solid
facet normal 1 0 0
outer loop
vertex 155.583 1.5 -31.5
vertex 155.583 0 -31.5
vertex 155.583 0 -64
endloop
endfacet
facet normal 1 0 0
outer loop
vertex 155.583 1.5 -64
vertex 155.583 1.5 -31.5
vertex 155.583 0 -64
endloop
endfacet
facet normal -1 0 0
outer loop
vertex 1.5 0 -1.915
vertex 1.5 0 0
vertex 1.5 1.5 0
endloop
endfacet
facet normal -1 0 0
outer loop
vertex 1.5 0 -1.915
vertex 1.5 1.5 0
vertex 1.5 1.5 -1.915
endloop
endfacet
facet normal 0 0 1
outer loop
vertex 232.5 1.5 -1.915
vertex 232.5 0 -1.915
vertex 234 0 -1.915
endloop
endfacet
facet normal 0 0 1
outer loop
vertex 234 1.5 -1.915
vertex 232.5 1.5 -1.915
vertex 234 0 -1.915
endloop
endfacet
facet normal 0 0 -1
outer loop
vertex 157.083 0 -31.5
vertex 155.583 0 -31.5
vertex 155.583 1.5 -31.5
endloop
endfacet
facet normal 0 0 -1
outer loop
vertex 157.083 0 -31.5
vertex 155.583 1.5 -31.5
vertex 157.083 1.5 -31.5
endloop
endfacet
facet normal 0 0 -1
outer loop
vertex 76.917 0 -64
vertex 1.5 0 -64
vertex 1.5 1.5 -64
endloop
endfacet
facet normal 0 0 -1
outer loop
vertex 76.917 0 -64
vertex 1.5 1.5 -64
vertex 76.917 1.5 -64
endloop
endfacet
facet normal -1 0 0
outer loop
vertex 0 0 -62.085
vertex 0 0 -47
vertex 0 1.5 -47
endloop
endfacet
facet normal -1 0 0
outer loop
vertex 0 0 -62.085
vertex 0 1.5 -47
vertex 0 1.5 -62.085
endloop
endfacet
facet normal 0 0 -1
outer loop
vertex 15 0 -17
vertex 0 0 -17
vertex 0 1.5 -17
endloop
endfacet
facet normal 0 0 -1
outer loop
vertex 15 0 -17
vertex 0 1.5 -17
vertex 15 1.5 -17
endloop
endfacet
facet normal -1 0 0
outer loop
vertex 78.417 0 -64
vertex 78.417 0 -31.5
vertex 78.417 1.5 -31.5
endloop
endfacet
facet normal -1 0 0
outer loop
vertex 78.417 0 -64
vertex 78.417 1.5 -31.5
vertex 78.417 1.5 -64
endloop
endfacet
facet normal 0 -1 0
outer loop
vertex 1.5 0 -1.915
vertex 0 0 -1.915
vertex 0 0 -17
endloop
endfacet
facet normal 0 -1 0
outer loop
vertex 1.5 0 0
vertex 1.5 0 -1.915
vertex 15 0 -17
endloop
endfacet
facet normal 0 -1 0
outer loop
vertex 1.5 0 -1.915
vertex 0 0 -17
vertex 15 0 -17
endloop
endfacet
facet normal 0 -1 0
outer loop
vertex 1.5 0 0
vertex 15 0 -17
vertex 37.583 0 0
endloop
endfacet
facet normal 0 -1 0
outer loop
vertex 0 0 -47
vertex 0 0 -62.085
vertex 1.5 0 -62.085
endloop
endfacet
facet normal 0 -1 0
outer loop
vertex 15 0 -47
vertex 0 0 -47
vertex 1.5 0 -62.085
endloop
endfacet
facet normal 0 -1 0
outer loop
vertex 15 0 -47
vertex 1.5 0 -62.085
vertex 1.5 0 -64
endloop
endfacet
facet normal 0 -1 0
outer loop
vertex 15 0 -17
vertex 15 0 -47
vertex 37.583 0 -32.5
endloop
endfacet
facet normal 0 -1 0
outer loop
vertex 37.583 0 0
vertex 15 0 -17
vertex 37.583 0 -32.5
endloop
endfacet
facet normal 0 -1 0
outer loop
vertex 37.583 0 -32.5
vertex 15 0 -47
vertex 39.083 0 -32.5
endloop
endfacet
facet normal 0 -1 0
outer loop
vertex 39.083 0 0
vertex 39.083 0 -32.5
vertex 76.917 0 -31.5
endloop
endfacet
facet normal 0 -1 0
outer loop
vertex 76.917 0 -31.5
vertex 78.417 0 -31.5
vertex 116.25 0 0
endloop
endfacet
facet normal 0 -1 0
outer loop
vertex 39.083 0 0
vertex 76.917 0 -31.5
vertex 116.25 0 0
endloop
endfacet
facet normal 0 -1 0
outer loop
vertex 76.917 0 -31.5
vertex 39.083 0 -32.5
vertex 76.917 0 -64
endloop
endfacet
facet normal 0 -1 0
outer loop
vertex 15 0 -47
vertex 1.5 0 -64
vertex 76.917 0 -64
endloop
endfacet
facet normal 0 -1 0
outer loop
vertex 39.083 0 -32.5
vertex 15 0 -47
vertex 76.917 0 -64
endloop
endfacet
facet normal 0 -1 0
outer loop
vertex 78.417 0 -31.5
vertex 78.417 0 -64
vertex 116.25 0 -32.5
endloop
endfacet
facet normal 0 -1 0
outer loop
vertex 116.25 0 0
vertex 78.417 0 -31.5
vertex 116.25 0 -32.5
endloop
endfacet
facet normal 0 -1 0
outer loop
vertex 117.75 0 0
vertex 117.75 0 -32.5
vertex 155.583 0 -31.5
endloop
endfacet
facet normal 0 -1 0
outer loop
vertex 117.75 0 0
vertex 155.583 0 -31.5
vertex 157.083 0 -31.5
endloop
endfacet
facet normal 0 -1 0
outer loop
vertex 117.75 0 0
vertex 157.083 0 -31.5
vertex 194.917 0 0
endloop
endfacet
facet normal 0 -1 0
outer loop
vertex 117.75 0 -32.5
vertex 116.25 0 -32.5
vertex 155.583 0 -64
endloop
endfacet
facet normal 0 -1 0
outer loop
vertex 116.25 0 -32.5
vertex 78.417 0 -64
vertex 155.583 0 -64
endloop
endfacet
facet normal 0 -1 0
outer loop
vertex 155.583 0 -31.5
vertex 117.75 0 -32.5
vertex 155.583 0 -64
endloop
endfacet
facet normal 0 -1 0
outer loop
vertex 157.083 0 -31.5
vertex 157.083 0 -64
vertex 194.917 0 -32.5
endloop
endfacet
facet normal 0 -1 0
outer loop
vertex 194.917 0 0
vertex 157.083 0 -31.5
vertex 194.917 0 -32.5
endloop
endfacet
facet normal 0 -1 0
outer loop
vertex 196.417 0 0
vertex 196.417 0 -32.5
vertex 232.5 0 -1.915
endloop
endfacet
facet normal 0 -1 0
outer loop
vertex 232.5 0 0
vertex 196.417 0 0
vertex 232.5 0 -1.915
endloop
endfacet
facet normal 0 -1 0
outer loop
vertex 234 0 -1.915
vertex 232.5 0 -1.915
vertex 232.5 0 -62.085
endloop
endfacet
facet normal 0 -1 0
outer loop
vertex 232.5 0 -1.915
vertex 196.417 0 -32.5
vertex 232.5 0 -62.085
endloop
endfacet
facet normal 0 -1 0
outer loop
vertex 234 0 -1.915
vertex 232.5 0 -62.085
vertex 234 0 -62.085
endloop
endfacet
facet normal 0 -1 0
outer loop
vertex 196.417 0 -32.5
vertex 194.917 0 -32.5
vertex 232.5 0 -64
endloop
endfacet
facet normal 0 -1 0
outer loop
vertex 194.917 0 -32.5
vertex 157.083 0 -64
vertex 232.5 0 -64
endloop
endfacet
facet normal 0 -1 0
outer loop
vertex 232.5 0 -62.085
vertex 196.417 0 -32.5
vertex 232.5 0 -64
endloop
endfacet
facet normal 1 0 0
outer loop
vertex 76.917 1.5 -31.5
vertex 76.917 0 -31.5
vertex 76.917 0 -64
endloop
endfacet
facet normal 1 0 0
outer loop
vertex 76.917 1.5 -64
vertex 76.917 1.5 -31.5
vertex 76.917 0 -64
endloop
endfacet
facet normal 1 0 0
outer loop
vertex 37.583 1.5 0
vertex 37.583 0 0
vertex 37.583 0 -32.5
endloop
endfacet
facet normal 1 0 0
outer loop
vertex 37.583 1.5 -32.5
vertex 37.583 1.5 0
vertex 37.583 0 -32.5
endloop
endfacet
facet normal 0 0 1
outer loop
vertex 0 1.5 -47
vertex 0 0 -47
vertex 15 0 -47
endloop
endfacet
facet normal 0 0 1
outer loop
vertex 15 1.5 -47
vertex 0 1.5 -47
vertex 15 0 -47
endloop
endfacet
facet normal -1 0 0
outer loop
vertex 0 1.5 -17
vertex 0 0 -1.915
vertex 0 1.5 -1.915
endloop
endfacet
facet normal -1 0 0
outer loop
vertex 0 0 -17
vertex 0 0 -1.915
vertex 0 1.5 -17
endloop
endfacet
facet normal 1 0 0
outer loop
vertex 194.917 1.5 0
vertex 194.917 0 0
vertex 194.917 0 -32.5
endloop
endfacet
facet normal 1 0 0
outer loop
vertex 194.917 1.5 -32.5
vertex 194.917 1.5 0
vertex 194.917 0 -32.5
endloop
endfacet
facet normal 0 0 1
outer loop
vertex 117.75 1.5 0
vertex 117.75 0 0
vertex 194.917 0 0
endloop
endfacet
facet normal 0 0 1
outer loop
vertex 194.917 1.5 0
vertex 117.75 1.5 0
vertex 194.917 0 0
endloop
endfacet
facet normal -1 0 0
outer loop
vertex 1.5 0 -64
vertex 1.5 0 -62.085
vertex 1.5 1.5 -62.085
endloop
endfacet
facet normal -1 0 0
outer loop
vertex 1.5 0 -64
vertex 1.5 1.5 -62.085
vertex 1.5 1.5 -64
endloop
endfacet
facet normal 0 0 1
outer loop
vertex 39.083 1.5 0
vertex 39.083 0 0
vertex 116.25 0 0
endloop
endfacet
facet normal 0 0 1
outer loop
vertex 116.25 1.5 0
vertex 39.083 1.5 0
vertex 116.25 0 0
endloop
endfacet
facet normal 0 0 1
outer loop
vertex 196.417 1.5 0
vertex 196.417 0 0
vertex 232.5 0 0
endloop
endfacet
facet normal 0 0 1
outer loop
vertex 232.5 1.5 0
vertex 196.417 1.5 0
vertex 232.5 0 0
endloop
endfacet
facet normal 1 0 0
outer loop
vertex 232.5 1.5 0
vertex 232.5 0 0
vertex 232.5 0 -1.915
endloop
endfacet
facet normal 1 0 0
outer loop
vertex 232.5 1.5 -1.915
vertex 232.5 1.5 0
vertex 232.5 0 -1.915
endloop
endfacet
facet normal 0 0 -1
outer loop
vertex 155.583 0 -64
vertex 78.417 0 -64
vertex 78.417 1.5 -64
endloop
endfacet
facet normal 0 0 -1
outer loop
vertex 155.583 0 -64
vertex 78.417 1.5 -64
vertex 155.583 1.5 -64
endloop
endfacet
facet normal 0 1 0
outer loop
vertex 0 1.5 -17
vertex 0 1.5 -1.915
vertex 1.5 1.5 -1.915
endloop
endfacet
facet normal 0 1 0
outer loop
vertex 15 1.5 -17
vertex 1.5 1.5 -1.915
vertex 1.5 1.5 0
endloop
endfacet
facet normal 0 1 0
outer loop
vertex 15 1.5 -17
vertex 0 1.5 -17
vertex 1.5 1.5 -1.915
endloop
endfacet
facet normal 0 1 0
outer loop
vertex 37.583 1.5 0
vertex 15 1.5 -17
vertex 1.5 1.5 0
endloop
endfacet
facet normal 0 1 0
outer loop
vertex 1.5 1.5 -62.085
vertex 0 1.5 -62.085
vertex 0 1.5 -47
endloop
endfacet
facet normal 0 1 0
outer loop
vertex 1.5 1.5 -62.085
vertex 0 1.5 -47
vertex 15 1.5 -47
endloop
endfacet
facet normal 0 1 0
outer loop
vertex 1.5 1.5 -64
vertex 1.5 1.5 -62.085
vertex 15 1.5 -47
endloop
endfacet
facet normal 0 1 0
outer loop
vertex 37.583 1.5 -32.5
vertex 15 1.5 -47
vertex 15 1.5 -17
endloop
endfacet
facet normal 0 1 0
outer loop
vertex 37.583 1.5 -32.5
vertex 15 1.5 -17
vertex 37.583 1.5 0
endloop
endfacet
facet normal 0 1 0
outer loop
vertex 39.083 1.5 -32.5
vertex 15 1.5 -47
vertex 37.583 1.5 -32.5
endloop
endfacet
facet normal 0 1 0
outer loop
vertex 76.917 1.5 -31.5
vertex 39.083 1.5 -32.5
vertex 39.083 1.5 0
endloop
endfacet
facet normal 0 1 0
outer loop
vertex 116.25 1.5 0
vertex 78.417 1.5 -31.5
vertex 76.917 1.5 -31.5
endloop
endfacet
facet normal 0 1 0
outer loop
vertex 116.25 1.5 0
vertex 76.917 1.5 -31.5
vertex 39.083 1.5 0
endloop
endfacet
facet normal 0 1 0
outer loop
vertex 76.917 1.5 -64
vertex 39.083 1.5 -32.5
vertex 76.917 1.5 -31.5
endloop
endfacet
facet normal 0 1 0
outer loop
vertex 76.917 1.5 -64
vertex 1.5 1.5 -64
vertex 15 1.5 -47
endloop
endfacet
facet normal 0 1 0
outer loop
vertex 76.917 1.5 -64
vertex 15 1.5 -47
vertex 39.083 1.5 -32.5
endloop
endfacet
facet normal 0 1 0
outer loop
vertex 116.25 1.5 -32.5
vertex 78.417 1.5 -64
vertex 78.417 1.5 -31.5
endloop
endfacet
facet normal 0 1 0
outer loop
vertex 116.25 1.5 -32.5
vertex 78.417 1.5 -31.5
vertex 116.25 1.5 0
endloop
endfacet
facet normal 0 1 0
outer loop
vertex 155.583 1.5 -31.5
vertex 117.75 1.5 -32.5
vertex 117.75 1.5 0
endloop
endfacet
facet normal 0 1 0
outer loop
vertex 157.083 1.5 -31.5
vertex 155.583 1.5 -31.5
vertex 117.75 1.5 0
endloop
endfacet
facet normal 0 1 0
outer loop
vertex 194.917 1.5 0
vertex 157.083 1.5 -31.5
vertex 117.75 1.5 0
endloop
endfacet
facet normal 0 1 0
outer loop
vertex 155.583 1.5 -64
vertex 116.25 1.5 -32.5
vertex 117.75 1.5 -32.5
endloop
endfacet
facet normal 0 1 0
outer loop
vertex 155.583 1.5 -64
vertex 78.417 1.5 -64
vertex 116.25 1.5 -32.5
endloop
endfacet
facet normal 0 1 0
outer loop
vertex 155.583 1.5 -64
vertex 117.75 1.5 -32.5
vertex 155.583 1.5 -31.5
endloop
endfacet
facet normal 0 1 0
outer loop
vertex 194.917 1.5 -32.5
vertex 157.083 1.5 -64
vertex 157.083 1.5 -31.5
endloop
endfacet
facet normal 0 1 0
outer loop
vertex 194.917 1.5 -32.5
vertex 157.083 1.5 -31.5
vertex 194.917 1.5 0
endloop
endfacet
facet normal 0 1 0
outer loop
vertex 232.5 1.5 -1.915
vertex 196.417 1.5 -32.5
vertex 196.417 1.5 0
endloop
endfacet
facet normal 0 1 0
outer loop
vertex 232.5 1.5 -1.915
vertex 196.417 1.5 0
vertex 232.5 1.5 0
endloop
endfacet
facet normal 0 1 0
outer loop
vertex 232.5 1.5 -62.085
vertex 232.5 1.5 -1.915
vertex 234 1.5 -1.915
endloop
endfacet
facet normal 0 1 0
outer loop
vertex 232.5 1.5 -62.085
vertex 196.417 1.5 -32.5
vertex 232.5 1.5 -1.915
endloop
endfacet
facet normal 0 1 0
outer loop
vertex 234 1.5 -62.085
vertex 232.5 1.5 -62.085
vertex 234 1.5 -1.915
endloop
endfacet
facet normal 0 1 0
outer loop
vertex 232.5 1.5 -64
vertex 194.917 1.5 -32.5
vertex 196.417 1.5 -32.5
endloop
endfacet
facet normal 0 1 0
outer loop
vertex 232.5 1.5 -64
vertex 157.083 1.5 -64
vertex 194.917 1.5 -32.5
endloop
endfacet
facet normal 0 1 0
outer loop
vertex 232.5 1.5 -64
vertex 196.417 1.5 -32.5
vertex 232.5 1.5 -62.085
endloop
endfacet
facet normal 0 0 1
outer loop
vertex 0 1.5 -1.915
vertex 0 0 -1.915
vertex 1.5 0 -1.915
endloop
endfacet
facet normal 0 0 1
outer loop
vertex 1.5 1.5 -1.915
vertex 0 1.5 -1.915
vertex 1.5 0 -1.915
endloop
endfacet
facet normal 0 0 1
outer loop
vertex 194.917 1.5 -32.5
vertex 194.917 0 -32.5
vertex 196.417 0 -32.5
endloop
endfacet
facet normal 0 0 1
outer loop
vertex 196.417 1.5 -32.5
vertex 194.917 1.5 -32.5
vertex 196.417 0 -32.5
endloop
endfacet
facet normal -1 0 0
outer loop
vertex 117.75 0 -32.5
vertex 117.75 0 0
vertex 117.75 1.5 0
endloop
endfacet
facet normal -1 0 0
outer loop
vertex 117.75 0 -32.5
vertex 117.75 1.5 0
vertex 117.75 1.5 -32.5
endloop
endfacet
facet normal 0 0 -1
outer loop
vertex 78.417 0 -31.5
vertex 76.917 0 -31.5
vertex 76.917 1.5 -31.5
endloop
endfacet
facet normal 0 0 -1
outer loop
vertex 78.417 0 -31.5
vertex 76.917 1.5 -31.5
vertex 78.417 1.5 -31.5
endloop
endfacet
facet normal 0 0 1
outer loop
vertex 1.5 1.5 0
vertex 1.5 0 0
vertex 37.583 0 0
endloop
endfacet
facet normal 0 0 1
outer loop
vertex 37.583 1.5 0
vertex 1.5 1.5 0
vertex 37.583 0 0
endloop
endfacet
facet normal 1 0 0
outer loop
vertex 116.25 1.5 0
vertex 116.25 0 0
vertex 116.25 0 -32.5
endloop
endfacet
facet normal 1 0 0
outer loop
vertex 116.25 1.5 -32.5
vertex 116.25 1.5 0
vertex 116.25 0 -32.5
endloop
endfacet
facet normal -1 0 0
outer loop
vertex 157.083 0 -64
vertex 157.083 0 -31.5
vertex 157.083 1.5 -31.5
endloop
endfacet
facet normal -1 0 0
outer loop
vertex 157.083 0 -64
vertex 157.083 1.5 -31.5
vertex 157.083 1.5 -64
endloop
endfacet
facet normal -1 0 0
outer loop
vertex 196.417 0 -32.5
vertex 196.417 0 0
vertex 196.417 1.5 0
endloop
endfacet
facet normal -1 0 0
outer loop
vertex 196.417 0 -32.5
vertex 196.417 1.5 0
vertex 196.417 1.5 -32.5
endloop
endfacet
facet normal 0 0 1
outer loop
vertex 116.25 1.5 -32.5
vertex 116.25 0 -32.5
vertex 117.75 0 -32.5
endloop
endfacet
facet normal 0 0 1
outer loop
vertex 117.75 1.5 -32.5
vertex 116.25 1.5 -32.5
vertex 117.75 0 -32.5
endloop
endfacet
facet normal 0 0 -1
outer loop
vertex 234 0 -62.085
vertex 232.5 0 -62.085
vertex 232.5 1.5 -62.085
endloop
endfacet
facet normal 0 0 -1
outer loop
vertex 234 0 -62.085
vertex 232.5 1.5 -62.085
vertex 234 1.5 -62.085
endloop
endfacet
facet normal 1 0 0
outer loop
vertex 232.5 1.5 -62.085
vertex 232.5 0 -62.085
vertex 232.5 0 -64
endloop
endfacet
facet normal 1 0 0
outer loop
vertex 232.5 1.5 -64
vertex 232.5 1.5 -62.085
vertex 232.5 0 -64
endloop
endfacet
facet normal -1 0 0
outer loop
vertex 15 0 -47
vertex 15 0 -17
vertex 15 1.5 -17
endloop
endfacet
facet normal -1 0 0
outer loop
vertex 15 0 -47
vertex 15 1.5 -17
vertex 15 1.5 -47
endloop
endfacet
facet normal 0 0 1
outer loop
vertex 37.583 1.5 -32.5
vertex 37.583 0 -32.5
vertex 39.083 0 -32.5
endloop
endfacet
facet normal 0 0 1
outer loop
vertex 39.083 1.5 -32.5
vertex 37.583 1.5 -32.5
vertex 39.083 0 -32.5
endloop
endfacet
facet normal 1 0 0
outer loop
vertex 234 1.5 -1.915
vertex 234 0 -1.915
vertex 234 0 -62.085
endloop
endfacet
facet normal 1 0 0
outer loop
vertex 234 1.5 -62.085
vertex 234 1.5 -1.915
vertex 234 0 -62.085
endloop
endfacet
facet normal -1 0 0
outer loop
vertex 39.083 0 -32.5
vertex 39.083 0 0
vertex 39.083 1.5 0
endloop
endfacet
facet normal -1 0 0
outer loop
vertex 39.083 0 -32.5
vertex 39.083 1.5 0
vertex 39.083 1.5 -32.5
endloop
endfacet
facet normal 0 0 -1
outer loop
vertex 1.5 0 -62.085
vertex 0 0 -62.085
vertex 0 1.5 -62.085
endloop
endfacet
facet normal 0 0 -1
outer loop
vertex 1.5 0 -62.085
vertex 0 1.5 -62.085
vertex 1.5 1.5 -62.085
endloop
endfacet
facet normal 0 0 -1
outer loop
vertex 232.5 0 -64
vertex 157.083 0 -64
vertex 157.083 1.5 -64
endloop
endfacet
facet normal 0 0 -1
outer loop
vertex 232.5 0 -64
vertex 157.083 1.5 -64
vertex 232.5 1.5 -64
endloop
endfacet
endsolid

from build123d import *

# Parameters (mm, degrees)
SKETCH1_W               = 234
SKETCH1_H               = 64
BOSS_EXTRUDE1_DEPTH     = 1.5
CUT_EXTRUDE1_DEPTH      = 243.598948885
CUT_EXTRUDE1_DEPTH_BACK = 243.598948885
SKETCH2_W               = 1.5
SKETCH2_H               = 32.5
SKETCH2_H_2             = 1.915
SKETCH2_W_2             = 15
SKETCH2_H_3             = 30


with BuildPart() as part:
    # Sketch1 → Boss-Extrude1 (new body)
    with BuildSketch(Plane(origin=(0, 0, 0), x_dir=(1, 0, 0), z_dir=(0, 1, 0))):
        with Locations((117, 32)):
            Rectangle(SKETCH1_W, SKETCH1_H)
    extrude(amount=BOSS_EXTRUDE1_DEPTH)

    # Sketch2 → Cut-Extrude1 (cut, two sides: drawn at the far end of the back side and taken through both)
    with BuildSketch(Plane(origin=(0, 1.5, 0), x_dir=(1, 0, 0), z_dir=(0, 1, 0)).offset(-CUT_EXTRUDE1_DEPTH_BACK)):
        with Locations((38.333333333, 16.25)):
            Rectangle(SKETCH2_W, SKETCH2_H)
        with Locations((77.666666667, 47.75)):
            Rectangle(SKETCH2_W, SKETCH2_H)
        with Locations((117, 16.25)):
            Rectangle(SKETCH2_W, SKETCH2_H)
        with Locations((195.666666667, 16.25)):
            Rectangle(SKETCH2_W, SKETCH2_H)
        with Locations((156.333333333, 47.75)):
            Rectangle(SKETCH2_W, SKETCH2_H)
        with Locations((0.75, 0.9575)):
            Rectangle(SKETCH2_W, SKETCH2_H_2)
        with Locations((0.75, 63.0425)):
            Rectangle(SKETCH2_W, SKETCH2_H_2)
        with Locations((233.25, 63.0425)):
            Rectangle(SKETCH2_W, SKETCH2_H_2)
        with Locations((233.25, 0.9575)):
            Rectangle(SKETCH2_W, SKETCH2_H_2)
        with Locations((7.5, 32)):
            Rectangle(SKETCH2_W_2, SKETCH2_H_3)
    extrude(amount=CUT_EXTRUDE1_DEPTH + CUT_EXTRUDE1_DEPTH_BACK, mode=Mode.SUBTRACT)


solid = part.part
